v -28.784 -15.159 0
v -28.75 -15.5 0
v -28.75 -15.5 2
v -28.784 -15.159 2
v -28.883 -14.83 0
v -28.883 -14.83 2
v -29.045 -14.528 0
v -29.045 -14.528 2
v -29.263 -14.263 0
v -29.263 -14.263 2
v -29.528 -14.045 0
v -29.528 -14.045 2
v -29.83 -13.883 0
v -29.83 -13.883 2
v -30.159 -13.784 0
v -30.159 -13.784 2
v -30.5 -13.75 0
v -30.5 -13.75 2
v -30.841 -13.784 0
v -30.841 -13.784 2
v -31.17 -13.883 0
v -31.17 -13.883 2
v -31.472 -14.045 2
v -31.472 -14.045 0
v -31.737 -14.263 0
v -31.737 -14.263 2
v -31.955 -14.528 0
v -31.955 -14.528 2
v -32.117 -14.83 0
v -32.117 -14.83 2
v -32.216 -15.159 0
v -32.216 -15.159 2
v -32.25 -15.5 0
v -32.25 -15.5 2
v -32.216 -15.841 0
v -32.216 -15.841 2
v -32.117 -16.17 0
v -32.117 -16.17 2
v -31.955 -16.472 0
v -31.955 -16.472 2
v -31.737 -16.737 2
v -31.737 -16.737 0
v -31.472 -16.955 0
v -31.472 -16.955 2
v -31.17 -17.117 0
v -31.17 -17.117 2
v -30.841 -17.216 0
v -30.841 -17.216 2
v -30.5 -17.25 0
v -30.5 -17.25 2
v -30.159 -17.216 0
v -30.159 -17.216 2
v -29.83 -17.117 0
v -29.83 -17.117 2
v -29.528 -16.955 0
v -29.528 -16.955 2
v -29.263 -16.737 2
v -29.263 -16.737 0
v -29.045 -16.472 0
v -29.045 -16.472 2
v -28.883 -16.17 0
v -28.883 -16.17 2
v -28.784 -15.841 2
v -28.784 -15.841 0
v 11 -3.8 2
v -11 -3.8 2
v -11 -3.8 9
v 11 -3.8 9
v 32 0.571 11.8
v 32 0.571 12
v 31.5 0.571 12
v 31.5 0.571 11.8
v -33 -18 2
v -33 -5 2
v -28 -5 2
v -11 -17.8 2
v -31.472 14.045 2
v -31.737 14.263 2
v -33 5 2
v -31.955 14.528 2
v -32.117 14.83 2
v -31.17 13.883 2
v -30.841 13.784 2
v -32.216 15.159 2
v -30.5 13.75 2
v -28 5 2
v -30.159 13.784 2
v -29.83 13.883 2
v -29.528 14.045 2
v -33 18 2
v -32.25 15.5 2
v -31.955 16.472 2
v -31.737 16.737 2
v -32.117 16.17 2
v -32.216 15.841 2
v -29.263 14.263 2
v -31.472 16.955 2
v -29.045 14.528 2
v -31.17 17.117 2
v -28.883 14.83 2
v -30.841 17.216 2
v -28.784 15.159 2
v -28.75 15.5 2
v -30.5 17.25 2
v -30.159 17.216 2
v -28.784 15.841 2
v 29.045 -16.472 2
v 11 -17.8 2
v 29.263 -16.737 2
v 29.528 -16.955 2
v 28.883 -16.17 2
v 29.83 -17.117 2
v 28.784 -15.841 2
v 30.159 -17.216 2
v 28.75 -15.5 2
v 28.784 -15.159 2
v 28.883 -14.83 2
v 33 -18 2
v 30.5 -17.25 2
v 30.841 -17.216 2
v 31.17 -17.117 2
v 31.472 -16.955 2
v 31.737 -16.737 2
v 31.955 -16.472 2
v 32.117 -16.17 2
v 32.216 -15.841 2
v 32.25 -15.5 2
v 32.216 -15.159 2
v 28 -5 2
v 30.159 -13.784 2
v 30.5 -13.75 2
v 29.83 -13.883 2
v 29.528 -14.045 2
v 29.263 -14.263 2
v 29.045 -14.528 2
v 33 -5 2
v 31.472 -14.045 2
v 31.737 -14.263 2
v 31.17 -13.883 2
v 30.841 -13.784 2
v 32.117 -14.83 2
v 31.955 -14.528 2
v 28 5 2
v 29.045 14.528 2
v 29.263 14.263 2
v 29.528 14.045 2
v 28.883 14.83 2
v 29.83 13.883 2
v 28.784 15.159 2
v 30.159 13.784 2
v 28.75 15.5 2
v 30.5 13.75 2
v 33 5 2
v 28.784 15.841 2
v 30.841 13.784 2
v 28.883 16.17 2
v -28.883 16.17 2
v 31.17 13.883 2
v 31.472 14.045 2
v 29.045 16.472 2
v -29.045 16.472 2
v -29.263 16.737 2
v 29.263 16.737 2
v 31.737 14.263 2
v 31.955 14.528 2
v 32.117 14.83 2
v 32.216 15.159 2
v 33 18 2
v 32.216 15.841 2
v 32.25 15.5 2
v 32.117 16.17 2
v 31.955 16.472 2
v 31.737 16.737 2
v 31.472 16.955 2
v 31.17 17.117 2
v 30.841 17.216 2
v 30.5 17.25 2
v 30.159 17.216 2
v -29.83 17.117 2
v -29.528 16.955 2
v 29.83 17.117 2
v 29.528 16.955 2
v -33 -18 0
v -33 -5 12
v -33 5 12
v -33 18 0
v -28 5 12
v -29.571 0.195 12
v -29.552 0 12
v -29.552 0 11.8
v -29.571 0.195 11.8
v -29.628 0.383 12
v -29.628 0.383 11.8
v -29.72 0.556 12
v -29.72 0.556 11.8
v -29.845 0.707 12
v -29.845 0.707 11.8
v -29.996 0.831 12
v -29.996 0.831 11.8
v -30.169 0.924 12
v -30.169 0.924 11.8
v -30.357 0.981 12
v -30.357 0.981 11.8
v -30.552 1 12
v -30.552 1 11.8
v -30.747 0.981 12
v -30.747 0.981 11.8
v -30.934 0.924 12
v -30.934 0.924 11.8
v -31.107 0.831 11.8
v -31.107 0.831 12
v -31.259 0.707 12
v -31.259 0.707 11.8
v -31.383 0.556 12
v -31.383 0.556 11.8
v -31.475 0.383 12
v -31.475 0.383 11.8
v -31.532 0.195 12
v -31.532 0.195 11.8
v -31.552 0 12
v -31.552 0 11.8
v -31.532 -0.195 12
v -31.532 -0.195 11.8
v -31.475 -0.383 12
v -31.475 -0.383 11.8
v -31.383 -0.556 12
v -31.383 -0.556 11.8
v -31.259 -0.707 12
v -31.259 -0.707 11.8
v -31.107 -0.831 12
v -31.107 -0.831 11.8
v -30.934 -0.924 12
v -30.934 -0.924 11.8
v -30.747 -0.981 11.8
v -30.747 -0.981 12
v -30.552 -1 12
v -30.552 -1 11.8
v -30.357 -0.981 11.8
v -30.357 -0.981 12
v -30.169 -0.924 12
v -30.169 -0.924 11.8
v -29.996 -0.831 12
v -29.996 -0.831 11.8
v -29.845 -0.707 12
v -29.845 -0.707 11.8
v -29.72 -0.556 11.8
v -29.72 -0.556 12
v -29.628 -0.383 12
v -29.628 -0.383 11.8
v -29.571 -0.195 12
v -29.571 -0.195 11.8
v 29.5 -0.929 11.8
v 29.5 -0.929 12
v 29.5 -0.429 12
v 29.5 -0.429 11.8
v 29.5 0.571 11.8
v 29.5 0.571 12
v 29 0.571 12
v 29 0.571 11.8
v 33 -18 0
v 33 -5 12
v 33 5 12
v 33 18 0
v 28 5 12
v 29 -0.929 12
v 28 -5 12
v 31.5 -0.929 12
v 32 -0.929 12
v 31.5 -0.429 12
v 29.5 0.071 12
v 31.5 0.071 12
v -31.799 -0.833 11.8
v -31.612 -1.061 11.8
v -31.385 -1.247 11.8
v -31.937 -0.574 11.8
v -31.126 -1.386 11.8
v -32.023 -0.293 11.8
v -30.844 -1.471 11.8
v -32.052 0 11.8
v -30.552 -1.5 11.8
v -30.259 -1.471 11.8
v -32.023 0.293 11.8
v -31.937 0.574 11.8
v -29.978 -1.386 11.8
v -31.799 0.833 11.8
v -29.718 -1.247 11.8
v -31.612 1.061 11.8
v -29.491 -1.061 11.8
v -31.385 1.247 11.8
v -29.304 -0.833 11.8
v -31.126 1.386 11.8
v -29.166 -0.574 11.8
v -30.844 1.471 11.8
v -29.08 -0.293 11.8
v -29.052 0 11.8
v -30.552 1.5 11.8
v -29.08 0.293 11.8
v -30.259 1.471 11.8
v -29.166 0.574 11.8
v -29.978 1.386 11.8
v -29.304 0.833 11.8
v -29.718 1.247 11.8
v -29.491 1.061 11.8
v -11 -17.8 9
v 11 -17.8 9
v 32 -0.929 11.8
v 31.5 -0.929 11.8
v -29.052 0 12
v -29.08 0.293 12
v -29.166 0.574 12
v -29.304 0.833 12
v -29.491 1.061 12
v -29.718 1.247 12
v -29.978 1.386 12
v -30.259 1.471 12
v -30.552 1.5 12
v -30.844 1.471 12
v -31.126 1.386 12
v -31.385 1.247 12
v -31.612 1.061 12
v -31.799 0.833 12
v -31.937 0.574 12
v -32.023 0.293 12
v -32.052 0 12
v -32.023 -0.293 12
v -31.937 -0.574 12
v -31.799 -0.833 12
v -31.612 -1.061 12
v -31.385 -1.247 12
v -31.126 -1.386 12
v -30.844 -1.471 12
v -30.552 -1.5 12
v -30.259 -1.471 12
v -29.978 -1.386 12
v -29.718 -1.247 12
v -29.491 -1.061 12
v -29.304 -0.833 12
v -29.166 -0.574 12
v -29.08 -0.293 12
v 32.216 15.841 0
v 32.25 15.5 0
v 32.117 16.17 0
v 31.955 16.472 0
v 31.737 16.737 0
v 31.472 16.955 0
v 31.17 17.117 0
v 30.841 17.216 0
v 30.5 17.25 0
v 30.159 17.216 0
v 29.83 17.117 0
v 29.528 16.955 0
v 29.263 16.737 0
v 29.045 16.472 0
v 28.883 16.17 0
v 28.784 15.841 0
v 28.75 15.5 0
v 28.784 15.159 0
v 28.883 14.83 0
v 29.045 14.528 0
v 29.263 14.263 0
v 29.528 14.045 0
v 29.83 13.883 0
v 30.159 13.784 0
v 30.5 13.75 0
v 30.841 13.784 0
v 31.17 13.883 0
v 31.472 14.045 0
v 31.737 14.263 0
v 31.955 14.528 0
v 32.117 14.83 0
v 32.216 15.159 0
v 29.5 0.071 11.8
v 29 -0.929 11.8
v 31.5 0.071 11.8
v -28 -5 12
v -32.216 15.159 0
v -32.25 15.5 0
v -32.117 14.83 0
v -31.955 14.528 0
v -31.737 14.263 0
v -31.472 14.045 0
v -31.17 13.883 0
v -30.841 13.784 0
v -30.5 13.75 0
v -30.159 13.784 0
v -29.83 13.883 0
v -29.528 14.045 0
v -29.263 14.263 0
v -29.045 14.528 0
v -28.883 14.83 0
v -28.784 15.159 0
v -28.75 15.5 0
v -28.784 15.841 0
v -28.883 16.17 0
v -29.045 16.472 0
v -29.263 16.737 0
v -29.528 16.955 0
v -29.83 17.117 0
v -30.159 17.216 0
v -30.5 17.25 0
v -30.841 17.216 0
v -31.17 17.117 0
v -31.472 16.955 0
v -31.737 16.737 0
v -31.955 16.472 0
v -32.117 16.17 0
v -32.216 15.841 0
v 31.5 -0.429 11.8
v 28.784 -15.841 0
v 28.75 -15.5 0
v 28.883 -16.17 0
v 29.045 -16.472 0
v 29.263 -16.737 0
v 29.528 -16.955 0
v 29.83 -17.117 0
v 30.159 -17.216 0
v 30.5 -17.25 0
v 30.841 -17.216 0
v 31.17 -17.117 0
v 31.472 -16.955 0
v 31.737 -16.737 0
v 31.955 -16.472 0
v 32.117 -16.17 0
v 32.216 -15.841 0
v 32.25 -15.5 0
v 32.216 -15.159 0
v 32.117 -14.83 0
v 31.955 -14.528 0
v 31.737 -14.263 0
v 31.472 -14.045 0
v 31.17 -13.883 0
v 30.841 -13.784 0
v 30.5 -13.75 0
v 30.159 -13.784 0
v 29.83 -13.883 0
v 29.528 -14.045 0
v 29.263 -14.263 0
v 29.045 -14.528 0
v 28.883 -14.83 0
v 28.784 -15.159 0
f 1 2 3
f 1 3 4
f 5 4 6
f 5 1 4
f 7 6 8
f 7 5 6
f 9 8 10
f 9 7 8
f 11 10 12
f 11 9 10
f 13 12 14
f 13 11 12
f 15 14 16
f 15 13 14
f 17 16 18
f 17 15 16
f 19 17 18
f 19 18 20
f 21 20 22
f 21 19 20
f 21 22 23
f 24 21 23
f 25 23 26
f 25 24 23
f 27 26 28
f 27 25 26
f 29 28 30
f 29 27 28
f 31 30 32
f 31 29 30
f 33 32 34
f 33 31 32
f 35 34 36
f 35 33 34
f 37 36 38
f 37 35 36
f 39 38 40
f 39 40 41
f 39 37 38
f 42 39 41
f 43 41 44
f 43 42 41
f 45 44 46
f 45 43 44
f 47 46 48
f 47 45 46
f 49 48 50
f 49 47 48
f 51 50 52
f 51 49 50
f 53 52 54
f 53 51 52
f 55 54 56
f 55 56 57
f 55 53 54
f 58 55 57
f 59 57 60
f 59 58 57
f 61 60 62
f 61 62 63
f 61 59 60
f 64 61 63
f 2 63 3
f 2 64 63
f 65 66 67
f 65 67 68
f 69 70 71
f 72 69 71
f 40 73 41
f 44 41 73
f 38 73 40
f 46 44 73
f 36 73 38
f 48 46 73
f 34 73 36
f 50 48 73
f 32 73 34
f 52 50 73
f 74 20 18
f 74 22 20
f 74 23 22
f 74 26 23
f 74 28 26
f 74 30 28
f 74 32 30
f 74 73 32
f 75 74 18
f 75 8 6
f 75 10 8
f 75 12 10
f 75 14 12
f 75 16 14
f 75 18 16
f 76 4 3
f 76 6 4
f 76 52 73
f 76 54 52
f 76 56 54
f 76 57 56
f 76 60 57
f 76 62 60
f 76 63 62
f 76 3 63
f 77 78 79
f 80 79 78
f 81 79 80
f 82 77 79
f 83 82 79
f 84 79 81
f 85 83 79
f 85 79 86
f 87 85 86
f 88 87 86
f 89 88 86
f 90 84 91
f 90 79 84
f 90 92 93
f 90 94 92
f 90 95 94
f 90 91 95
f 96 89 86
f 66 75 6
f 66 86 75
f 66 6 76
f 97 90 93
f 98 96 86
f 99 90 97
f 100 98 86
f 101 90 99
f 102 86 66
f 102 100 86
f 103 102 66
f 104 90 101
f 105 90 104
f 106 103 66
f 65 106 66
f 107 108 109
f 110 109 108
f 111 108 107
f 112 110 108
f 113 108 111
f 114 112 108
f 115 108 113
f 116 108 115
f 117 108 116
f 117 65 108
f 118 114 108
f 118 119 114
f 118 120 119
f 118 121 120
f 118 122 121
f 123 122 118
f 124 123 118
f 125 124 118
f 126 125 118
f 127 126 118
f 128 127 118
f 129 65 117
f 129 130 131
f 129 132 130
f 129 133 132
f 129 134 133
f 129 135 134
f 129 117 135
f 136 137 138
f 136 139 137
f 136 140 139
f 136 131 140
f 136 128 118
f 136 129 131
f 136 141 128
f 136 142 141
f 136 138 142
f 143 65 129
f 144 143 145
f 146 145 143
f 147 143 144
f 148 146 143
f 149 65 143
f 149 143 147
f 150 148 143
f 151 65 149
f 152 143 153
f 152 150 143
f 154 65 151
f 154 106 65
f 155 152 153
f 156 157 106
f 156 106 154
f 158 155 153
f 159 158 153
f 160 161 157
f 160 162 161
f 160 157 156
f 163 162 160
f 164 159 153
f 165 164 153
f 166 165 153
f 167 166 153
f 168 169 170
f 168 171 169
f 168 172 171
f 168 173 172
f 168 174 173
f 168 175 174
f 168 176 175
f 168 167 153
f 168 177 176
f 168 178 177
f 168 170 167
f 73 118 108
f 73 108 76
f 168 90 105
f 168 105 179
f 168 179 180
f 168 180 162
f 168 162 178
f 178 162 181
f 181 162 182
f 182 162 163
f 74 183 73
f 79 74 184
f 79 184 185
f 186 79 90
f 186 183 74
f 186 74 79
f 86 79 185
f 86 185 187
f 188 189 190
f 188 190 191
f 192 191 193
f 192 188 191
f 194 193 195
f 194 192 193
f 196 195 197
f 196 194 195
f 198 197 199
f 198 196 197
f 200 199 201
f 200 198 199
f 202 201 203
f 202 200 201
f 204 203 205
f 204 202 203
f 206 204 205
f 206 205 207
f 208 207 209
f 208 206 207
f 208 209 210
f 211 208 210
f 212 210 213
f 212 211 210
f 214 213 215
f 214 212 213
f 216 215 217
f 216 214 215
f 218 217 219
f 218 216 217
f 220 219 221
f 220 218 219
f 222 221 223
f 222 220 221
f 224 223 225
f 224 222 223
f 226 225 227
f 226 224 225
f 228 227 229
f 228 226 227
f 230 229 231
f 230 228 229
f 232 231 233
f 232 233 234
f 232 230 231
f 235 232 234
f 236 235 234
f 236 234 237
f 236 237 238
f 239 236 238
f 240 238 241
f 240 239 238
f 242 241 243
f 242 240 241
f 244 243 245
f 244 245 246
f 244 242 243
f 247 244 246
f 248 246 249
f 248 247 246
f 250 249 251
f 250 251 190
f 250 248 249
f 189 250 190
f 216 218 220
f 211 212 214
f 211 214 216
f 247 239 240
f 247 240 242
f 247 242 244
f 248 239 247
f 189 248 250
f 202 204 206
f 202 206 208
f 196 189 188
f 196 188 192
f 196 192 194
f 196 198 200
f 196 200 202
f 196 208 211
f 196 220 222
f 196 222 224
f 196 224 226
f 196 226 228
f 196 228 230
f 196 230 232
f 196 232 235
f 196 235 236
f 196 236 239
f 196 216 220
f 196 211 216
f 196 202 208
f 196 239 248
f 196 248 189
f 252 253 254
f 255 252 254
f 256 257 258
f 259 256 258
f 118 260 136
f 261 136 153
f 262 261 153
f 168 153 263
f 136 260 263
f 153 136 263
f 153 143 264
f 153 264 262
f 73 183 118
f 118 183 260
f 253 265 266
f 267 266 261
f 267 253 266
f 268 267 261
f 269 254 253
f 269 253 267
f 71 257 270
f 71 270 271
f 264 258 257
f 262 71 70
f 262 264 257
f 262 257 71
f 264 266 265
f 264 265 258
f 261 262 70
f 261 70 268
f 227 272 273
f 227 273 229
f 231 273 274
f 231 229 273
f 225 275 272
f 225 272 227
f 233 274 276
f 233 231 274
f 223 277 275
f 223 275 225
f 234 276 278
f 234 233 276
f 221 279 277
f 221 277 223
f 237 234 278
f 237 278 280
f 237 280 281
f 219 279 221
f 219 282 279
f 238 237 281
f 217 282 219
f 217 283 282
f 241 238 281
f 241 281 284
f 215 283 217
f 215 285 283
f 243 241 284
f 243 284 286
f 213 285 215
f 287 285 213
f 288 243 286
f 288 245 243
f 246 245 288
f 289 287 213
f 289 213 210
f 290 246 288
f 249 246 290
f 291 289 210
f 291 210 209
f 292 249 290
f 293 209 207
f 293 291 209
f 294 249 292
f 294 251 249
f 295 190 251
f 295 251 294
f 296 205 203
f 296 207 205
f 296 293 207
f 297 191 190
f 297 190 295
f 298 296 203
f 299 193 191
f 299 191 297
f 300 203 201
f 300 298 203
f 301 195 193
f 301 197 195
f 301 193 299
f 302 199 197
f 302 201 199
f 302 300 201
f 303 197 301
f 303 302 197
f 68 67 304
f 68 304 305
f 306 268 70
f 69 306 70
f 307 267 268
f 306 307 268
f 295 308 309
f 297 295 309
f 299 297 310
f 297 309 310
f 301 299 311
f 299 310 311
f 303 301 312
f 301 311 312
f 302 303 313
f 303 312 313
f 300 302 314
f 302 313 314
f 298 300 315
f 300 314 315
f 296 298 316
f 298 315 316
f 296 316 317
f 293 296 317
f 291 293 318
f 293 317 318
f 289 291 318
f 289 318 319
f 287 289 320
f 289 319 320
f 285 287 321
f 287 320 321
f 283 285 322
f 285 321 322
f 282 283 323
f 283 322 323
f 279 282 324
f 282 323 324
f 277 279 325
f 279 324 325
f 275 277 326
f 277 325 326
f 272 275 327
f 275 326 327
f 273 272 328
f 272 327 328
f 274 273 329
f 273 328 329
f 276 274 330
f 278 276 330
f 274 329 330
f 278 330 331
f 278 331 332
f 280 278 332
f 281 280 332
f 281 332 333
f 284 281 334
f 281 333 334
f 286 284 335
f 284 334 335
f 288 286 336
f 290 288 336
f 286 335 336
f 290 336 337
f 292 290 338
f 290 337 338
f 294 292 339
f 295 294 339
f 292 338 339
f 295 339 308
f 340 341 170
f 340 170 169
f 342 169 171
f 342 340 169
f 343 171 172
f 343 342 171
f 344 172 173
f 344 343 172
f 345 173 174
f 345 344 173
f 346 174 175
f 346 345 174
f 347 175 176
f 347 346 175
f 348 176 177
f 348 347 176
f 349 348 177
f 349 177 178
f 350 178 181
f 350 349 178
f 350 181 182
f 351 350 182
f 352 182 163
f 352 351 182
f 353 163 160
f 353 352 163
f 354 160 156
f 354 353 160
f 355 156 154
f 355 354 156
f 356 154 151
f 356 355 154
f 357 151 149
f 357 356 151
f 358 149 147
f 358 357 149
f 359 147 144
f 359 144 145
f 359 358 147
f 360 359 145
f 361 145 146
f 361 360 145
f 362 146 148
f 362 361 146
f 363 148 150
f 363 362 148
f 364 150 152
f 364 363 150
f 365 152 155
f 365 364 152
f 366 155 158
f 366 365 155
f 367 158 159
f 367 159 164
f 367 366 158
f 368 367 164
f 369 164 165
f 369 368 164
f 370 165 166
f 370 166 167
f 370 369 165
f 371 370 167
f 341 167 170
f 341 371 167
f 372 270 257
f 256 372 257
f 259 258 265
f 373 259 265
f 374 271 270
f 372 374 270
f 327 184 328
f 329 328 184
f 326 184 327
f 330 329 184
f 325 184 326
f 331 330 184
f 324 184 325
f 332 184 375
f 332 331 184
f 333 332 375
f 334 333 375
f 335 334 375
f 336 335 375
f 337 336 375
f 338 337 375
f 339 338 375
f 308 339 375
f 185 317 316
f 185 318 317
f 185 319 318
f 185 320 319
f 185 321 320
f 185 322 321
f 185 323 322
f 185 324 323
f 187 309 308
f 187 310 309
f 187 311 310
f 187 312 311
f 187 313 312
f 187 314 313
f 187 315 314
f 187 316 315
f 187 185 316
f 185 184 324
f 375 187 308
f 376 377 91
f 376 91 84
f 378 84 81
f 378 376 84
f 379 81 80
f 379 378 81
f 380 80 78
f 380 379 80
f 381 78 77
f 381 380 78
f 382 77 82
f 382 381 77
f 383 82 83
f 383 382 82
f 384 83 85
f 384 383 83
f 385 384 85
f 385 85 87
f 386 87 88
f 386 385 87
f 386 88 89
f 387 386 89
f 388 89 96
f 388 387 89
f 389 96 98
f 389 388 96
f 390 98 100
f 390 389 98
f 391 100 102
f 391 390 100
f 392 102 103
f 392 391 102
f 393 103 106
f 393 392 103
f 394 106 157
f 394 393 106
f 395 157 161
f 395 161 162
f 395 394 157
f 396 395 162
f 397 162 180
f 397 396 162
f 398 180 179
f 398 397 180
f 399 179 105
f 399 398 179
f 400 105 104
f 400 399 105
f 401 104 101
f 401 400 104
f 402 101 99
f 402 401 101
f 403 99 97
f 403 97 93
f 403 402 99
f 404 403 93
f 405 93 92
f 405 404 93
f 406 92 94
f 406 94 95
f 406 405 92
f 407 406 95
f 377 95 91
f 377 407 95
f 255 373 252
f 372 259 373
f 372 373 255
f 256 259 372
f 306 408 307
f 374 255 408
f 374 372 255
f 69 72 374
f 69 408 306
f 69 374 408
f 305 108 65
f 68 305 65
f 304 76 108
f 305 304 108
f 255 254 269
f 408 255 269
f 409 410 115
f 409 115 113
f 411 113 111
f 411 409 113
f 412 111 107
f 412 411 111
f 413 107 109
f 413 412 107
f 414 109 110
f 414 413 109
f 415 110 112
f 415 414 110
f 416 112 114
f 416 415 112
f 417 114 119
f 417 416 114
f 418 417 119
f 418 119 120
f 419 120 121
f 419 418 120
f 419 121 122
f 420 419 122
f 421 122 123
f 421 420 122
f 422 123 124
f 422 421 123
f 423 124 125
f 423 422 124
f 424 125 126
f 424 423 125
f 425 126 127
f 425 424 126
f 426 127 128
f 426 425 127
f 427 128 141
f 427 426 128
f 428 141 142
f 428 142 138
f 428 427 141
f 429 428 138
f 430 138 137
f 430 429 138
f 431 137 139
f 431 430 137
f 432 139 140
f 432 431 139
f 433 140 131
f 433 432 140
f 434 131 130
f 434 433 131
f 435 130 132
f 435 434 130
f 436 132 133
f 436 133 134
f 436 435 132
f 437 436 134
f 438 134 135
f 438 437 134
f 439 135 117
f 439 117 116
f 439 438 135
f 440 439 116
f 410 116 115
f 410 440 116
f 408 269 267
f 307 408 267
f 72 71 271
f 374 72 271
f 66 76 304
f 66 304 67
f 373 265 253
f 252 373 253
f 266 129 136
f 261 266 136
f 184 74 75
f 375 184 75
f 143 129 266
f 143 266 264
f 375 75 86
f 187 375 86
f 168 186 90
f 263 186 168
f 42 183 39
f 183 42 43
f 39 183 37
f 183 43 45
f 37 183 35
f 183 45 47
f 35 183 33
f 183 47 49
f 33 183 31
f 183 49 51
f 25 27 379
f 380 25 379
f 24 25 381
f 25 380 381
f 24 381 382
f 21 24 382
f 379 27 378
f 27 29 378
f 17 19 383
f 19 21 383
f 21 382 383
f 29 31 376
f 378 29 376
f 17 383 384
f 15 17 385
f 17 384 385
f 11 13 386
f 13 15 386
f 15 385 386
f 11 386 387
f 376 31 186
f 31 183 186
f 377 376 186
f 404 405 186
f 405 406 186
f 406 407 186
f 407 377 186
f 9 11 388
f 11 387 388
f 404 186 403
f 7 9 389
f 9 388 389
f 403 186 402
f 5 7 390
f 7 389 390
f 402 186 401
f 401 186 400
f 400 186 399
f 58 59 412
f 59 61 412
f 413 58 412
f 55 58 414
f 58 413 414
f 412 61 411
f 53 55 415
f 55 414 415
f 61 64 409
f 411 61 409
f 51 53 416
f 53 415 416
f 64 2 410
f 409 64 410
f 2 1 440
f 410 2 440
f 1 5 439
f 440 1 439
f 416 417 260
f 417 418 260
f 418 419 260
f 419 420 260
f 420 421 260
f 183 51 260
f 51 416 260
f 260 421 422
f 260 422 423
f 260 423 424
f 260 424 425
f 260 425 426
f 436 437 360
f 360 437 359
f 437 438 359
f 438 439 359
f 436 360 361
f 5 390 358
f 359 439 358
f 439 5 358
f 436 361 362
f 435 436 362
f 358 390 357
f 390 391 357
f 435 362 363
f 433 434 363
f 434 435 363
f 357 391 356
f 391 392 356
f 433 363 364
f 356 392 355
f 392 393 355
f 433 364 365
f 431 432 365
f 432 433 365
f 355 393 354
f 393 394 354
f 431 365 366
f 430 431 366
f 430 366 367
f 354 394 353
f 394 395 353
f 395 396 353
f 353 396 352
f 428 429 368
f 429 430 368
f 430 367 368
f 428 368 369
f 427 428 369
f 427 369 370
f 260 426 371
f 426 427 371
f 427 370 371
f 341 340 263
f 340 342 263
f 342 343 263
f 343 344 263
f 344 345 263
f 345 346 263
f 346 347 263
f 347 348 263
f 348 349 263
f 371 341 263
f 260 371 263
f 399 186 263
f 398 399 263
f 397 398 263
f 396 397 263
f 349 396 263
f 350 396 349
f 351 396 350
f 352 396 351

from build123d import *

# Parameters (mm, degrees)
SKETCH_1_W          = 66
SKETCH_1_H          = 36
SKETCH_1_R          = 1.75
EXTRUDE_1_DEPTH     = 2
SKETCH_2_W          = 22
SKETCH_2_H          = 14
EXTRUDE_2_DEPTH     = 7
SKETCH_3_W          = 5
SKETCH_3_H          = 10
EXTRUDE_3_DEPTH     = 10
CUT_EXTRUDE_1_DEPTH = 0.2
SKETCH_5_R          = 1.5
SKETCH_5_R_2        = 1
CUT_EXTRUDE_2_DEPTH = 0.2


with BuildPart() as part:
    # 草图1 → 凸台-拉伸1 (new body)
    with BuildSketch(Plane.XY):
        Rectangle(SKETCH_1_W, SKETCH_1_H)
        with Locations((30.5, 15.5)):
            Circle(SKETCH_1_R, mode=Mode.SUBTRACT)
        with Locations(Location((30.5, -15.5, 0), (0, 0, 180))):
            Circle(SKETCH_1_R, mode=Mode.SUBTRACT)
        with Locations((-30.5, -15.5)):
            Circle(SKETCH_1_R, mode=Mode.SUBTRACT)
        with Locations(Location((-30.5, 15.5, 0), (0, 0, 180))):
            Circle(SKETCH_1_R, mode=Mode.SUBTRACT)
    extrude(amount=EXTRUDE_1_DEPTH)

    # 草图2 → 凸台-拉伸2 (add)
    with BuildSketch(Plane.XY.offset(2)):
        with Locations((0, -10.8)):
            Rectangle(SKETCH_2_W, SKETCH_2_H)
    extrude(amount=EXTRUDE_2_DEPTH)

    # 草图3 → 凸台-拉伸3 (add)
    with BuildSketch(Plane.XY.offset(2)):
        with Locations((-30.5, 0)):
            Rectangle(SKETCH_3_W, SKETCH_3_H)
        with Locations((30.5, 0)):
            Rectangle(SKETCH_3_W, SKETCH_3_H)
    extrude(amount=EXTRUDE_3_DEPTH)

    # 草图4 → 切除-拉伸1 (cut)
    with BuildSketch(Plane.XY.offset(12)):
        Polygon((29, 0.571414009), (29, -0.928585991), (29.5, -0.928585991), (29.5, -0.428585991), (31.5, -0.428585991), (31.5, -0.928585991), (32, -0.928585991), (32, 0.571414009), (31.5, 0.571414009), (31.5, 0.071414009), (29.5, 0.071414009), (29.5, 0.571414009), align=None)
    extrude(amount=-CUT_EXTRUDE_1_DEPTH, mode=Mode.SUBTRACT)

    # 草图5 → 切除-拉伸2 (cut)
    with BuildSketch(Plane.XY.offset(12)):
        with Locations((-30.551618455, 0)):
            Circle(SKETCH_5_R)
        with Locations((-30.551618455, 0)):
            Circle(SKETCH_5_R_2, mode=Mode.SUBTRACT)
    extrude(amount=-CUT_EXTRUDE_2_DEPTH, mode=Mode.SUBTRACT)


solid = part.part
